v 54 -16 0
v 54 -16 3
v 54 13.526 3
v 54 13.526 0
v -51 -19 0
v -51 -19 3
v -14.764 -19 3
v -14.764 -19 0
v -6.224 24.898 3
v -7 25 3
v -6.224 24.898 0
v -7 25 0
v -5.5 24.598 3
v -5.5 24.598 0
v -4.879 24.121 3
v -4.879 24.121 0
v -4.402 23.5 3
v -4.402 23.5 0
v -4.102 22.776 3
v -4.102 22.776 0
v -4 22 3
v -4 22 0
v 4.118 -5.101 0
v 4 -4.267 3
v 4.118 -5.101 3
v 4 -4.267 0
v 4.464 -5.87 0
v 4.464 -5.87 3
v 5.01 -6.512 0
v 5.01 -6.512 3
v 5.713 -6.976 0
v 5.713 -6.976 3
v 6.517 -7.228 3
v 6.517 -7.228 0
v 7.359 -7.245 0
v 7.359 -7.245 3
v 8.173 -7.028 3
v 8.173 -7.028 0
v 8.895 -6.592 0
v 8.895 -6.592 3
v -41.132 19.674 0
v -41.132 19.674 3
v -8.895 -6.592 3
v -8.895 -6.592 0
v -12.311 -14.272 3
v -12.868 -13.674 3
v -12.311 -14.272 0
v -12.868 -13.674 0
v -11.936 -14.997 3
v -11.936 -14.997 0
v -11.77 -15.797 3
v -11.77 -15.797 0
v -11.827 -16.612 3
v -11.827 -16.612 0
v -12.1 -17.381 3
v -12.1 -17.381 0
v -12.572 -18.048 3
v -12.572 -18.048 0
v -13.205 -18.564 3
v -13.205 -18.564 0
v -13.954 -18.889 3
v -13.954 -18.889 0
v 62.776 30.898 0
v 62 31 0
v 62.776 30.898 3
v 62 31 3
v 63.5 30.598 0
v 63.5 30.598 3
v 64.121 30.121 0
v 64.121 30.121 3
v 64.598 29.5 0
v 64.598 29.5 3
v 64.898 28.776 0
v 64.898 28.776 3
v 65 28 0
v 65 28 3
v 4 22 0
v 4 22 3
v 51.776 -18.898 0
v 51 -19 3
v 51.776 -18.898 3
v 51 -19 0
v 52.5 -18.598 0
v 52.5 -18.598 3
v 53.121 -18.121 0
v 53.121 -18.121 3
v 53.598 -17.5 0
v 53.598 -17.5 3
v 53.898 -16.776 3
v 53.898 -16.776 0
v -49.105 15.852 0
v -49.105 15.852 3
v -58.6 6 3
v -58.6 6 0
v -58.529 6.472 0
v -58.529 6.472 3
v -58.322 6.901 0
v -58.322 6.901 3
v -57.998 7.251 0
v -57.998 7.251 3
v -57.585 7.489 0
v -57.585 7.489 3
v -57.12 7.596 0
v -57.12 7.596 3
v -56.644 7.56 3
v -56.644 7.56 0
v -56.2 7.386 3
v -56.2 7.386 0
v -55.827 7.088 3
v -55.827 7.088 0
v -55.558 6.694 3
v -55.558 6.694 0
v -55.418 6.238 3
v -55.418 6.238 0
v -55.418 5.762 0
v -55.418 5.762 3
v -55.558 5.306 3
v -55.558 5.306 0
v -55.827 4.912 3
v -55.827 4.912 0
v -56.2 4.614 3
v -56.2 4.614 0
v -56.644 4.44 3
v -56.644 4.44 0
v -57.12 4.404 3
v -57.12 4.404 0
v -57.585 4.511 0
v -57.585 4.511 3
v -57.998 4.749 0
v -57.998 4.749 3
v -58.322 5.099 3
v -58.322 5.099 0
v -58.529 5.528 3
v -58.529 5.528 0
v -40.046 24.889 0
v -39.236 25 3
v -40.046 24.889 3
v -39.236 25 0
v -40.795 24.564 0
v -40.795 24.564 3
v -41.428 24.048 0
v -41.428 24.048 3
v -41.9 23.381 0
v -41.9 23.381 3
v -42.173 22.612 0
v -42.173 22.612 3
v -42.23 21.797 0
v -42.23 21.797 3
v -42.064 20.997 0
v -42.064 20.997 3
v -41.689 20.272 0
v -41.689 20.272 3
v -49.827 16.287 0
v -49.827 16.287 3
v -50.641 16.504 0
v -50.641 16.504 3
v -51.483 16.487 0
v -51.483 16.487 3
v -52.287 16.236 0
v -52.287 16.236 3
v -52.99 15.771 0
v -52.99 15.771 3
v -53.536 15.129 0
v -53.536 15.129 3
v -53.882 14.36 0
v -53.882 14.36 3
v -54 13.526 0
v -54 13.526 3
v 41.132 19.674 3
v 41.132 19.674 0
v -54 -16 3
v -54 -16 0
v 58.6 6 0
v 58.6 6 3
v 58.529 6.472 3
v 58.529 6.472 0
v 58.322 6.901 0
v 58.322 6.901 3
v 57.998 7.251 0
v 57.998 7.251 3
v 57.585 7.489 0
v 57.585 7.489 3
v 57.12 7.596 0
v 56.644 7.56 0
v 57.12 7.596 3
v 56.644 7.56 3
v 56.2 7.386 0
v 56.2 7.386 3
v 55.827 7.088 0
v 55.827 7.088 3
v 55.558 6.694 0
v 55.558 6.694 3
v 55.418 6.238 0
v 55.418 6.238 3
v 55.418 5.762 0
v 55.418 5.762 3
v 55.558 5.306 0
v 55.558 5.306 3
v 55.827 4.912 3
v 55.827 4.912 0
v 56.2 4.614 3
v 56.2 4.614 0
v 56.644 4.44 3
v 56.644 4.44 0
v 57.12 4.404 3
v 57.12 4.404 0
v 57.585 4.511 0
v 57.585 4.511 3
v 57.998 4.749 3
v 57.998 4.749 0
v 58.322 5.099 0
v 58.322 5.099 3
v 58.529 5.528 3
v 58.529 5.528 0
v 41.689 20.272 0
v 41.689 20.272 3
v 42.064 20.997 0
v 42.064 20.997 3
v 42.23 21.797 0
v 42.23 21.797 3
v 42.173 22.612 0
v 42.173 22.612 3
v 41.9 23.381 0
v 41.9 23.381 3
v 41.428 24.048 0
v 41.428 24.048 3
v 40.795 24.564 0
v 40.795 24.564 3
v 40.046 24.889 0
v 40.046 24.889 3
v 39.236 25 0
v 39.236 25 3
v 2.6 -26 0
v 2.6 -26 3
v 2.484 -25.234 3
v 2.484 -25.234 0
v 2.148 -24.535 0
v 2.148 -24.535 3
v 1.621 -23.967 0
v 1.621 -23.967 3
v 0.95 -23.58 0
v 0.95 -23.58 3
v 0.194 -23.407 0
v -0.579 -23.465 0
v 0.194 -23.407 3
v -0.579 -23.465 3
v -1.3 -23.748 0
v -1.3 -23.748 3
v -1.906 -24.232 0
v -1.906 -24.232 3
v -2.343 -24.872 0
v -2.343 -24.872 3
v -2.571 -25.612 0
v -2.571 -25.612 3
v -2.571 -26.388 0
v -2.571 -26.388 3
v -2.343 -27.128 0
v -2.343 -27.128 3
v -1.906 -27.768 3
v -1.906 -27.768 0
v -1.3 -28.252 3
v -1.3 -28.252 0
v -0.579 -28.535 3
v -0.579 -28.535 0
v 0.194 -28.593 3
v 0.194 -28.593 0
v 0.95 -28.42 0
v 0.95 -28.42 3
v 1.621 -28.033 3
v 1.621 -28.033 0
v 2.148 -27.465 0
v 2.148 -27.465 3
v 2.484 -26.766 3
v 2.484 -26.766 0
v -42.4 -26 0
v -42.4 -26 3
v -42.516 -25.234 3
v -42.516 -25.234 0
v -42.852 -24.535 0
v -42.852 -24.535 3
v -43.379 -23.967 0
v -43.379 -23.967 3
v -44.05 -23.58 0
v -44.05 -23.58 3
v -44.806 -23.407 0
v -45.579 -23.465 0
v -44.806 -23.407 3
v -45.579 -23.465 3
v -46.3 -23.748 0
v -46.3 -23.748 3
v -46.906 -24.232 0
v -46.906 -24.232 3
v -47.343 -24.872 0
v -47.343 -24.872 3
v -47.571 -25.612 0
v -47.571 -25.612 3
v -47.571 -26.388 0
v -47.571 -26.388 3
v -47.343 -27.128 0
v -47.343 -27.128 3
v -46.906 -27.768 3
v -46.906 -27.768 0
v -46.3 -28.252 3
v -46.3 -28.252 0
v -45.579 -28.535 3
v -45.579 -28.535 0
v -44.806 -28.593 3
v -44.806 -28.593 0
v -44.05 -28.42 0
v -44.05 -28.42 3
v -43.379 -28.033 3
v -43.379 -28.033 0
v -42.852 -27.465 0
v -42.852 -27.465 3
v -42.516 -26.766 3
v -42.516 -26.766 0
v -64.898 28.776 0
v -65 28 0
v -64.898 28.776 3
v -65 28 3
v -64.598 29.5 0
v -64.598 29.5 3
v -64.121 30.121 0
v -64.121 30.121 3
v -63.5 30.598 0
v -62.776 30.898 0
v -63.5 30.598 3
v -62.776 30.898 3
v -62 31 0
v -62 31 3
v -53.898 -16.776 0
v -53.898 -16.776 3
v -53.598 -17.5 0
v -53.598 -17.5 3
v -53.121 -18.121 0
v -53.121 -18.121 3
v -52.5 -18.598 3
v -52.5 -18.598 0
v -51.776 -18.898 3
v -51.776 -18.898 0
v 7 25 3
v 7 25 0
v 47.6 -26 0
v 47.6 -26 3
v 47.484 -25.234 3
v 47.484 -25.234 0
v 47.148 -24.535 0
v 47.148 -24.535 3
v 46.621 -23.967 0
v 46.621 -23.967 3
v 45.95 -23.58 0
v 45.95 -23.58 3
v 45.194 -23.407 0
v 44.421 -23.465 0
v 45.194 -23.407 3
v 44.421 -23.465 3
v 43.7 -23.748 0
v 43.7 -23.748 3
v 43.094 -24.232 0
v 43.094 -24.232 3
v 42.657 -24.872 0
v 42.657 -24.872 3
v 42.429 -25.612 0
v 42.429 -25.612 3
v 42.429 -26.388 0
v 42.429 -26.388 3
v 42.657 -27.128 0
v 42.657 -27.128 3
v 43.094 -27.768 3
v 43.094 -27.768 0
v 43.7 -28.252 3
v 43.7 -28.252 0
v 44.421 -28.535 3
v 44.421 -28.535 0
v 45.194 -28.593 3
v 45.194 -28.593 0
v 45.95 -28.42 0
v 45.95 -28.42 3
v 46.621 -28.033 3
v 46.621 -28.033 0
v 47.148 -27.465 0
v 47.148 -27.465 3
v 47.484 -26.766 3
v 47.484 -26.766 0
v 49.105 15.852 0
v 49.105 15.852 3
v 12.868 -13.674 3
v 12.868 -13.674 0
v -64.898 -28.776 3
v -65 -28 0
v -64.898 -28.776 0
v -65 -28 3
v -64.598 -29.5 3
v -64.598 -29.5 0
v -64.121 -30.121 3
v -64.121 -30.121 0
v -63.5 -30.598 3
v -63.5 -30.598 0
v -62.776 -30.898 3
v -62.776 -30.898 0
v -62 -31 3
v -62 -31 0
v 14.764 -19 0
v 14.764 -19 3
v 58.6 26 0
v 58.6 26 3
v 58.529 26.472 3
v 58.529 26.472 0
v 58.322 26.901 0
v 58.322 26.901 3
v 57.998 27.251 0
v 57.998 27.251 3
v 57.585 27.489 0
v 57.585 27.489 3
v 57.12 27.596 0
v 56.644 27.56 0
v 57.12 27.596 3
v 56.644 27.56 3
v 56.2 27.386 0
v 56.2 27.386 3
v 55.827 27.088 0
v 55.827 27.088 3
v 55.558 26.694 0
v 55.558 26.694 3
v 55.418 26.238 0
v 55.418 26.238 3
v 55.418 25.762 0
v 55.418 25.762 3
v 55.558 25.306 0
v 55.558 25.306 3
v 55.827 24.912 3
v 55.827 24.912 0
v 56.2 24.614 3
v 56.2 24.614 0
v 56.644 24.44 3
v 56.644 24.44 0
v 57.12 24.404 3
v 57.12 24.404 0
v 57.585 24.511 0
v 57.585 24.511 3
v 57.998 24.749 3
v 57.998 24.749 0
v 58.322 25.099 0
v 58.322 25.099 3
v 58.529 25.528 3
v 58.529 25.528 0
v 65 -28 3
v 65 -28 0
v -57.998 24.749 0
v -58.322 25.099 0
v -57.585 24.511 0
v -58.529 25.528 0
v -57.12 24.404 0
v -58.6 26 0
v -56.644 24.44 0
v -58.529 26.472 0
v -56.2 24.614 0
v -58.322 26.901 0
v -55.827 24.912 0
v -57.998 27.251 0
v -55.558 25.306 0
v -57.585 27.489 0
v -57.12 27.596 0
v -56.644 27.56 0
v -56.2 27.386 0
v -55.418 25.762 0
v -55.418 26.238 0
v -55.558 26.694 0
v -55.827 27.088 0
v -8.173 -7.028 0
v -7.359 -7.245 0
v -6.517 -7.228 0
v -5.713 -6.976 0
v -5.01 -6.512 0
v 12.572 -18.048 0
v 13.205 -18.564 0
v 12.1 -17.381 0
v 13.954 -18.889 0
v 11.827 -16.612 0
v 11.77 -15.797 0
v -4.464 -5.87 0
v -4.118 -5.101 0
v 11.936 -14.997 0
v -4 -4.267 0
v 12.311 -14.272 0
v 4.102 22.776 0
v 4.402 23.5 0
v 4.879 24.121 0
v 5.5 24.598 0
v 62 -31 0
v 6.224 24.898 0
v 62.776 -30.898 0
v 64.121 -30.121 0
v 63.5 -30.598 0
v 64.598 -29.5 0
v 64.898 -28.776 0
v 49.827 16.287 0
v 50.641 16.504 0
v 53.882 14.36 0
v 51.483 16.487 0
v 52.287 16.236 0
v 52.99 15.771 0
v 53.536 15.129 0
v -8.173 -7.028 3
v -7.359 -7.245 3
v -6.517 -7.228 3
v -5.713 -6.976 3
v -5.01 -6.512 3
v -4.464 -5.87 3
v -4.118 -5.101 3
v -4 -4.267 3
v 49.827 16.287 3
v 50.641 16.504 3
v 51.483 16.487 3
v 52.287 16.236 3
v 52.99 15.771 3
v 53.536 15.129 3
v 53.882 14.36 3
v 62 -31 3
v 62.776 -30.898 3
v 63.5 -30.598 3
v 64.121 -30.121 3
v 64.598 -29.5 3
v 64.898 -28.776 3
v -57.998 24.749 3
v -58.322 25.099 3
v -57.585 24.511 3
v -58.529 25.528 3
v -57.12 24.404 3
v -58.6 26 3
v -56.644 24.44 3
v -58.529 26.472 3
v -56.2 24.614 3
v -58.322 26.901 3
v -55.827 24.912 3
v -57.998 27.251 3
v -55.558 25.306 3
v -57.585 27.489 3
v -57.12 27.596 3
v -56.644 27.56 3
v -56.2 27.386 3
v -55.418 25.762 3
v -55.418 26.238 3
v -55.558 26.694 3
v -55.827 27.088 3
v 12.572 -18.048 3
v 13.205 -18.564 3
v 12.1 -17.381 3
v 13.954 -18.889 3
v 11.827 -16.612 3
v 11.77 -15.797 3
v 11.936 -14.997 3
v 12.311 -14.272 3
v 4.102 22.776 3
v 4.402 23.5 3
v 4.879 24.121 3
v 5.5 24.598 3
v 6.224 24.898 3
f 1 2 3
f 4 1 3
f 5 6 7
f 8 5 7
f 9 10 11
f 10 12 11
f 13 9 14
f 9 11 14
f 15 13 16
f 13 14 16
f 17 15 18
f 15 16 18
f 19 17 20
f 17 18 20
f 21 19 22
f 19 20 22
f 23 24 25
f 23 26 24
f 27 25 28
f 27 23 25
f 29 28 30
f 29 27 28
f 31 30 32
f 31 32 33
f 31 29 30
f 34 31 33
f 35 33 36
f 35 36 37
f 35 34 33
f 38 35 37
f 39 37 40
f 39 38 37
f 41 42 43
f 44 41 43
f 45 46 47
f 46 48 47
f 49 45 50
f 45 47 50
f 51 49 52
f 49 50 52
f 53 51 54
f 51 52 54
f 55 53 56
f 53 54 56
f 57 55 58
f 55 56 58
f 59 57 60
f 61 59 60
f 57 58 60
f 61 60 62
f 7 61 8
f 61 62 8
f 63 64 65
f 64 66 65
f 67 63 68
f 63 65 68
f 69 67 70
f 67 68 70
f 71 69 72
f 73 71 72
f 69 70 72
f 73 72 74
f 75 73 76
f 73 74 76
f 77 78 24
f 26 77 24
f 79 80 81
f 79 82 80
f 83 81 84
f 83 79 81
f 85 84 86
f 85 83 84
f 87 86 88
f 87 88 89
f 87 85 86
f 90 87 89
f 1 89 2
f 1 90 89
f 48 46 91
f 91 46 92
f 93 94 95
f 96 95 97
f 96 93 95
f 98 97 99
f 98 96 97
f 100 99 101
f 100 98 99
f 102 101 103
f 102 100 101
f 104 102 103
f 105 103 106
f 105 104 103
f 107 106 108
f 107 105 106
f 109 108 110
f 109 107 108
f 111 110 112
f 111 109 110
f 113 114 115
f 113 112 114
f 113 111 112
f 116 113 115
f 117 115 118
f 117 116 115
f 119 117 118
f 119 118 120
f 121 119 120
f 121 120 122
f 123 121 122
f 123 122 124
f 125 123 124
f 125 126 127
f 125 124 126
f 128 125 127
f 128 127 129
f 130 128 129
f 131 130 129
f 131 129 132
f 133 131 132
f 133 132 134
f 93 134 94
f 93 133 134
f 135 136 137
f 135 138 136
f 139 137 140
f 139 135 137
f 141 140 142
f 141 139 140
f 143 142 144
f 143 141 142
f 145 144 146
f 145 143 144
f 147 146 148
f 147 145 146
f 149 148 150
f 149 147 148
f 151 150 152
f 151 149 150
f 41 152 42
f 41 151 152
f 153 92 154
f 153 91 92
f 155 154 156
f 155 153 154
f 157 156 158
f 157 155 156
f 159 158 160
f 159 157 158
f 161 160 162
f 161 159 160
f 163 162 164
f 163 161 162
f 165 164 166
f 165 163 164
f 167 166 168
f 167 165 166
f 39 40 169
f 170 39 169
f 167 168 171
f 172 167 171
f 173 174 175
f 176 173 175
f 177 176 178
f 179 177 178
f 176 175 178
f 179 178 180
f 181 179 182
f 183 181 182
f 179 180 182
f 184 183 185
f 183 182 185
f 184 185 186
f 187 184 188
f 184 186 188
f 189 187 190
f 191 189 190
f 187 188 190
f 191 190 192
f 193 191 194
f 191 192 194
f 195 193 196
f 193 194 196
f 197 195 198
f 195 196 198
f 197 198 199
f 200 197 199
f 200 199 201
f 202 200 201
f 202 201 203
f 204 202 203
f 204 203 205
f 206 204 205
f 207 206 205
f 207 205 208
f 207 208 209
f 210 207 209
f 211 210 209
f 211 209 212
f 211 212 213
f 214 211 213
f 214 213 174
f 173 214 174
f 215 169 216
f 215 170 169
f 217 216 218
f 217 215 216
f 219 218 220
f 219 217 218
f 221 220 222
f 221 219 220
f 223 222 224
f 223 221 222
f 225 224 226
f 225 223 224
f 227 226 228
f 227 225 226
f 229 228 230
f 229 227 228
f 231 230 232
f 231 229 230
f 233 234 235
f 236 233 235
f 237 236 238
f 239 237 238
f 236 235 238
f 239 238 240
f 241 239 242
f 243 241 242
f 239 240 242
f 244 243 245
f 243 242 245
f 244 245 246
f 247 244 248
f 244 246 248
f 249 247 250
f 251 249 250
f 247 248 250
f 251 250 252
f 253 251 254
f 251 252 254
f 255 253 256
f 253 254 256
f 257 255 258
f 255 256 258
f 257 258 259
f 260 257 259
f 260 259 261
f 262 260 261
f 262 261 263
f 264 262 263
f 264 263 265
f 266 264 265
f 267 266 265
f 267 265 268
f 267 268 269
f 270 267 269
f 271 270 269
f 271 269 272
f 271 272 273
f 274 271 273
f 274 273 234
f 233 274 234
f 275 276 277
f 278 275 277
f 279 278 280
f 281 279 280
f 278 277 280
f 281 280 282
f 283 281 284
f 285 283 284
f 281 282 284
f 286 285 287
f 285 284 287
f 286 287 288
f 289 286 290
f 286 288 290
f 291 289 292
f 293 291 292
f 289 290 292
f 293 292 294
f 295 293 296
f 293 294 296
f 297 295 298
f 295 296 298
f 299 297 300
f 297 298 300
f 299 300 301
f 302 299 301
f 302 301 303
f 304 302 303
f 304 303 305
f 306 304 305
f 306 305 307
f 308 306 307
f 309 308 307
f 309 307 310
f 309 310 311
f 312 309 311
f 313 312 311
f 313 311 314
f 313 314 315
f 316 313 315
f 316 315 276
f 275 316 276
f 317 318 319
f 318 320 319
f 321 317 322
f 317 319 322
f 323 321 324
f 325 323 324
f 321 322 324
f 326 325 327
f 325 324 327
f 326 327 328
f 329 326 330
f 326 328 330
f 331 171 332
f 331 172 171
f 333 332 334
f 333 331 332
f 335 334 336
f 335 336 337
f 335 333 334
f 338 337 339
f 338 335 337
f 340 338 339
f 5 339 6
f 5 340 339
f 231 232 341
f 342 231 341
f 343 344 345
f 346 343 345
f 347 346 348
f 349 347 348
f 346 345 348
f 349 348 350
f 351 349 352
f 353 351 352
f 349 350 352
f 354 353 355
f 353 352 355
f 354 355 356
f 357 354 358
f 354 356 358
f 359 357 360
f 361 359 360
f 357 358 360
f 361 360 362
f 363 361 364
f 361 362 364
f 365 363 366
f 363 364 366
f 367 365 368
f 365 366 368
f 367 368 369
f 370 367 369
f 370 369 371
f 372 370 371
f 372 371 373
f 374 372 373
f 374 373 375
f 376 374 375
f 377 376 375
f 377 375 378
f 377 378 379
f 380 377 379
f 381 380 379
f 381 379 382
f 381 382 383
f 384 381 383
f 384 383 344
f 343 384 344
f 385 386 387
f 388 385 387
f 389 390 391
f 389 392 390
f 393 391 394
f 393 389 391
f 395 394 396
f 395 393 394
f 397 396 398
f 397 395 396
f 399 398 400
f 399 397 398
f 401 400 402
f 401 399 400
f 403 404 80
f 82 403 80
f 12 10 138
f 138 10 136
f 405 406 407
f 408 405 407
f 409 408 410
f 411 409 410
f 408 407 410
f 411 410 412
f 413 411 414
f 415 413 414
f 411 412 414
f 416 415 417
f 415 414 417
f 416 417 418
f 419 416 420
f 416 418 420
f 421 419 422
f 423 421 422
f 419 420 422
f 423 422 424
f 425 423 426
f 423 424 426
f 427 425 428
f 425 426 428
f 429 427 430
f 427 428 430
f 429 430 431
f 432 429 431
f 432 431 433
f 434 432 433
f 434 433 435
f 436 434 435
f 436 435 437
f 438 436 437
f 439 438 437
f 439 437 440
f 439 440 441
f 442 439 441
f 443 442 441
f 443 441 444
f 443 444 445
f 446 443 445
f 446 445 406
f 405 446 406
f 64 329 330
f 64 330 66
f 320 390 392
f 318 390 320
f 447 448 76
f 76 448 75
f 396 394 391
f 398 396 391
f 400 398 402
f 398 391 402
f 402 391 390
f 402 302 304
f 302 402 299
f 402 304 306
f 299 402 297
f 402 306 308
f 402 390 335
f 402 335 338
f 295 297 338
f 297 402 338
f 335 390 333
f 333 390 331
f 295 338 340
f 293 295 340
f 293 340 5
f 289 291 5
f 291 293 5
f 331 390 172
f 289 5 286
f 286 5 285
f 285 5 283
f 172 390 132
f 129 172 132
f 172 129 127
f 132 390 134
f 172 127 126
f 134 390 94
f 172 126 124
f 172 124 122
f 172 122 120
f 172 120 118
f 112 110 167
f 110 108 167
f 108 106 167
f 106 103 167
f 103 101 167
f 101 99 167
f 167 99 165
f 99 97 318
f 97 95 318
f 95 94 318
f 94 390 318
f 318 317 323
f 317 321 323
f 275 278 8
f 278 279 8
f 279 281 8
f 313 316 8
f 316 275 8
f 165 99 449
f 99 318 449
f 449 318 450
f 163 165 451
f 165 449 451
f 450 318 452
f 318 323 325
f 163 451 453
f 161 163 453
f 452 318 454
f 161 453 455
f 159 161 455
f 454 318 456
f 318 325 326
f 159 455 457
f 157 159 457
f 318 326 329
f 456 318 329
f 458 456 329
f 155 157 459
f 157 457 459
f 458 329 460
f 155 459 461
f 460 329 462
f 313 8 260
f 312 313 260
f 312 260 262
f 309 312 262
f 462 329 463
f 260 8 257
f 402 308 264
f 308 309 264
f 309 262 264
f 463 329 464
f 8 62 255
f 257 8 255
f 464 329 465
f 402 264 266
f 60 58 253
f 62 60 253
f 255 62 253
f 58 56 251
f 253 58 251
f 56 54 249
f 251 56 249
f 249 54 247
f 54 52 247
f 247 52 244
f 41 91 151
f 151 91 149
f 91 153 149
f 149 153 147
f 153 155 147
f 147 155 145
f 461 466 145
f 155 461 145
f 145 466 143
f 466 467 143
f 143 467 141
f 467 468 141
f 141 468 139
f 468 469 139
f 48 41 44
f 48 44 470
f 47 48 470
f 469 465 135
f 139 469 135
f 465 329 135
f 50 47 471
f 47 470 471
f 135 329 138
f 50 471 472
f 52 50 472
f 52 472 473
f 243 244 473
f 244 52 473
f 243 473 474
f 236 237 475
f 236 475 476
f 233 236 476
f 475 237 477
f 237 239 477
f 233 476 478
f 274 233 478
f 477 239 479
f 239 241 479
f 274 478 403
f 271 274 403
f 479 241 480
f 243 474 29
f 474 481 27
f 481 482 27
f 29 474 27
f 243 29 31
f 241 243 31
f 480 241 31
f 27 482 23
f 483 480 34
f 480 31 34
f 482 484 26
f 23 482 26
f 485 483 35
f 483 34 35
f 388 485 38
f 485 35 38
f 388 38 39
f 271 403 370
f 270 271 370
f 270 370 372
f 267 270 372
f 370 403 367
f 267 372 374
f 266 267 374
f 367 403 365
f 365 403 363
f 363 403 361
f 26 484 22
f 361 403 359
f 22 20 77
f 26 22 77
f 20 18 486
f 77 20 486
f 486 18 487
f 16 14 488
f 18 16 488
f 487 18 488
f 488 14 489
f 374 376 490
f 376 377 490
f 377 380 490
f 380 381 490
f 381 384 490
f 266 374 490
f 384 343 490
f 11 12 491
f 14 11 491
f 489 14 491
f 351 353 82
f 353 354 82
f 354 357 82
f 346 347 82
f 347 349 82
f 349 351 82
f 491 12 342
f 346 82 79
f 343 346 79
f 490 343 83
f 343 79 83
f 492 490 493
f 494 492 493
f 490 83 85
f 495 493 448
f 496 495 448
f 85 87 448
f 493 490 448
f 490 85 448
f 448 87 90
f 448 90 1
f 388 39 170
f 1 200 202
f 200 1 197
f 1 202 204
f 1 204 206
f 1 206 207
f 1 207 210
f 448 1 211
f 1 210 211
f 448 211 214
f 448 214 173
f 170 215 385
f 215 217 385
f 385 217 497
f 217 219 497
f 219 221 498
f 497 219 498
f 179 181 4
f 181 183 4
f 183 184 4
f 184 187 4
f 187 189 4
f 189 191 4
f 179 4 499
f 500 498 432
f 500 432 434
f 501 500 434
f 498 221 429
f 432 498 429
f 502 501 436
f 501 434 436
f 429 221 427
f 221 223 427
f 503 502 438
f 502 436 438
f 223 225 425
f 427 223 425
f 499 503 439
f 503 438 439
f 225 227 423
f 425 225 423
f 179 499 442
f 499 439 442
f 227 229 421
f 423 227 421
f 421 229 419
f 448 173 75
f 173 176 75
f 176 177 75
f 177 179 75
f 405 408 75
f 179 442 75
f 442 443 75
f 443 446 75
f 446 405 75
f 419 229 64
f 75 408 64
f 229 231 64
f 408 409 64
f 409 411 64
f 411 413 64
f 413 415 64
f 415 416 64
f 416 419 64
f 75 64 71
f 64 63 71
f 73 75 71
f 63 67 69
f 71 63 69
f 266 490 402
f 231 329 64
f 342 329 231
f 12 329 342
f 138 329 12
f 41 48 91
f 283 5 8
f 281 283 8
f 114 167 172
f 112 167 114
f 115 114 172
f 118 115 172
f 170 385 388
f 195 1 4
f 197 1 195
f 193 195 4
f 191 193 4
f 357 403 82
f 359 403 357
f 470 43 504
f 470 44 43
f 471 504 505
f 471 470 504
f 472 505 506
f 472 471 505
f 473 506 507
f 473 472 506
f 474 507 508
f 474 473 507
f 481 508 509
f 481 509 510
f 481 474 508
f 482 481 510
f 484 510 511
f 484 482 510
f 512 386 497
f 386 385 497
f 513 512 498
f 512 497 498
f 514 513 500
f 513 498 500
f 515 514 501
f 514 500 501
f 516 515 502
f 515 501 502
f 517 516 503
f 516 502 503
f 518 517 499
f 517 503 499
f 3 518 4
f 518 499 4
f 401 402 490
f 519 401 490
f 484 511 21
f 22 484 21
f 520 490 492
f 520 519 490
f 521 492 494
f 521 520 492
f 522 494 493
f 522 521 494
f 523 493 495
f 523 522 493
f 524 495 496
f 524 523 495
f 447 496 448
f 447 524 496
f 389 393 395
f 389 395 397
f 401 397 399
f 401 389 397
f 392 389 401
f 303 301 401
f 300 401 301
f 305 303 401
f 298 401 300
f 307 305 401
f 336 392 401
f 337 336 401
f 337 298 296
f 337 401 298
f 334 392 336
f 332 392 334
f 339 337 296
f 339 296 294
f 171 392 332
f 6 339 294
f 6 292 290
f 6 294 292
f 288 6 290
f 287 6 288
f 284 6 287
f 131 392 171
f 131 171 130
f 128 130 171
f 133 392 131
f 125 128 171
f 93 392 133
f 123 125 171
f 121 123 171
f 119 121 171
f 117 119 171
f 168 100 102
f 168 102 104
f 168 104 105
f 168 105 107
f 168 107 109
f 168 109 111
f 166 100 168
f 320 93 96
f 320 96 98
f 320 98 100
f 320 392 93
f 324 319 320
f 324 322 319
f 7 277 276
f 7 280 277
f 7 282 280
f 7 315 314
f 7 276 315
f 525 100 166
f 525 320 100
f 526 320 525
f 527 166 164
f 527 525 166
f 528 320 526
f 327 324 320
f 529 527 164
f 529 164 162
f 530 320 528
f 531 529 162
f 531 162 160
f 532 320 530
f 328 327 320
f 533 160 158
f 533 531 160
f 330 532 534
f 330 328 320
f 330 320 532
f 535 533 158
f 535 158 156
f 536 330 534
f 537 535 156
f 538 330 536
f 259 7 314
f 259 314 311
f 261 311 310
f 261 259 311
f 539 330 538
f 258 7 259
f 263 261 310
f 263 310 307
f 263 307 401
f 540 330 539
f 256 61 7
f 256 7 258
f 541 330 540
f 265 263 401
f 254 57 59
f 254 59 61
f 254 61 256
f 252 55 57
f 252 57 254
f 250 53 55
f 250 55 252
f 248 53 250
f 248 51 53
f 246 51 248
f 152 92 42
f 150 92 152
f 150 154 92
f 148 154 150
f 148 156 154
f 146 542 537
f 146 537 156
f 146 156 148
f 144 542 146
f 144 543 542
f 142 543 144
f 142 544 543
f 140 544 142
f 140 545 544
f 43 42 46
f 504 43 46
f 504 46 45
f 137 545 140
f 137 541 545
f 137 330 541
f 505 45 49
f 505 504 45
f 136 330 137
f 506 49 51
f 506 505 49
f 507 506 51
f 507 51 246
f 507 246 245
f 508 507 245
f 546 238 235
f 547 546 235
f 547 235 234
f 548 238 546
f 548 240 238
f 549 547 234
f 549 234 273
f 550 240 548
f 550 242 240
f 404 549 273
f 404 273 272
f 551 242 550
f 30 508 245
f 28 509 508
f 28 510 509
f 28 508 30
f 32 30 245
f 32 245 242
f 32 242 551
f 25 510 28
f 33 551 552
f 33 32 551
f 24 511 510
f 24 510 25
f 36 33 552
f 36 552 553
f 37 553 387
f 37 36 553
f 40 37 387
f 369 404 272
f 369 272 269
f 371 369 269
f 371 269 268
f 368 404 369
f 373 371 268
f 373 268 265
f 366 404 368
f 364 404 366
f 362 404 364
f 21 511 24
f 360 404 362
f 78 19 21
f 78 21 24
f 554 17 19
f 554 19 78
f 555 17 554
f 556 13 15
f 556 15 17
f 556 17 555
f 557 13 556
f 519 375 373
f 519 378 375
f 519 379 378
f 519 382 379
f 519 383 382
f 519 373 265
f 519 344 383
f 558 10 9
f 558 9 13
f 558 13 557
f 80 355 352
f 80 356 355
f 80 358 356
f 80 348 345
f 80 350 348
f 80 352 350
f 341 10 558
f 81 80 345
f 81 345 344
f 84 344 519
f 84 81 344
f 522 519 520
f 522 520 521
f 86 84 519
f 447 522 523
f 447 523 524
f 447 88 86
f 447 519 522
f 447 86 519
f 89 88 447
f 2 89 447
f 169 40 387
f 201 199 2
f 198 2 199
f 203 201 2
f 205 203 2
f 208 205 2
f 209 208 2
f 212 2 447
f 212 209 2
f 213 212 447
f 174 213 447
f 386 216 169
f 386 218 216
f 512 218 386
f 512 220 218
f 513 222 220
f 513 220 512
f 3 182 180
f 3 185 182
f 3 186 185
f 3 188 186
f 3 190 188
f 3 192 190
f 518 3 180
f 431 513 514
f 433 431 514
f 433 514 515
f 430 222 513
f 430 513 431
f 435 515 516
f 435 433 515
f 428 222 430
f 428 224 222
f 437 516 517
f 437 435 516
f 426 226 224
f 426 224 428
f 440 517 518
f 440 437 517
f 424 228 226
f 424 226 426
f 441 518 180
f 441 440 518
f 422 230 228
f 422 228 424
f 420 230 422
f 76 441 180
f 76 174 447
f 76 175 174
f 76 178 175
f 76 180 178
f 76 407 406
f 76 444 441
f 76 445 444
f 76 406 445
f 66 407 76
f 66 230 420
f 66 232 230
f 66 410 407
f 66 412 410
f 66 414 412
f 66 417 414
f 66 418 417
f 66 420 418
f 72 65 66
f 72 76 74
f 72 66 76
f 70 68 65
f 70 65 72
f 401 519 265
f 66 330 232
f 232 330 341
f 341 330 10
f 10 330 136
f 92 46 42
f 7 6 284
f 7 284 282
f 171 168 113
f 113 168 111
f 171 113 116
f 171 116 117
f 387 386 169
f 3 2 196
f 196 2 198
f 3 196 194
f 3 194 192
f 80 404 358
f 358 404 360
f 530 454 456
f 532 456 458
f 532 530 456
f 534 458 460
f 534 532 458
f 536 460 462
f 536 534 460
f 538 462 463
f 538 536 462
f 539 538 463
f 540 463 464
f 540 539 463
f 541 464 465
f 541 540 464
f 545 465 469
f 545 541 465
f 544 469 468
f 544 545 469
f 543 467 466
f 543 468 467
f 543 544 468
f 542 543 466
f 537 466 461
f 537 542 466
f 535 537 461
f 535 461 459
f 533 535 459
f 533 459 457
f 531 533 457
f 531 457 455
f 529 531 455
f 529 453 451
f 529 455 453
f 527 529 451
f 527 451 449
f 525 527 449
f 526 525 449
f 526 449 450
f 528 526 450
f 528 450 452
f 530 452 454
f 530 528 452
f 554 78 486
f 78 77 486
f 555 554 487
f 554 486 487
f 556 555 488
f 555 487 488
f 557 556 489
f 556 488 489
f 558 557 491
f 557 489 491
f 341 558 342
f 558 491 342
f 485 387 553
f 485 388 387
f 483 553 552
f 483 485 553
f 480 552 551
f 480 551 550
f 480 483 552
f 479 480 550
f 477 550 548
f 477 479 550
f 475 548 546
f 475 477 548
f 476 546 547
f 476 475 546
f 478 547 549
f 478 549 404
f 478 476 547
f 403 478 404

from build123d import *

# Parameters (mm, degrees)
SKETCH_1_W          = 130
SKETCH_1_H          = 62
EXTRUDE_1_DEPTH     = 3
SKETCH_2_R          = 2.6
CUT_EXTRUDE_1_DEPTH = 4
SKETCH_3_R          = 1.6
CUT_EXTRUDE_2_DEPTH = 4
CUT_EXTRUDE_3_DEPTH = 4
FILLET_1_R          = 3
FILLET_2_R          = 3


with BuildPart() as part:
    # 草图1 → 凸台-拉伸1 (new body)
    with BuildSketch(Plane.XY):
        Rectangle(SKETCH_1_W, SKETCH_1_H)
    extrude(amount=EXTRUDE_1_DEPTH)

    # 草图2 → 切除-拉伸1 (cut, through all)
    with BuildSketch(Plane.XY.offset(3)):
        with Locations((-45, -26)):
            Circle(SKETCH_2_R)
        with Locations((0, -26)):
            Circle(SKETCH_2_R)
        with Locations((45, -26)):
            Circle(SKETCH_2_R)
    extrude(amount=-CUT_EXTRUDE_1_DEPTH, mode=Mode.SUBTRACT)

    # 草图3 → 切除-拉伸2 (cut, through all)
    with BuildSketch(Plane.XY.offset(3)):
        with Locations((57, 26)):
            Circle(SKETCH_3_R)
        with Locations((57, 6)):
            Circle(SKETCH_3_R)
    cut_extrude_2 = extrude(amount=-CUT_EXTRUDE_2_DEPTH, mode=Mode.SUBTRACT)

    # 镜向1: 切除-拉伸2 across plane
    add(cut_extrude_2.mirror(Plane(origin=(0, 0, 0), x_dir=(0, 0, 1), z_dir=(1, 0, 0))), mode=Mode.SUBTRACT)

    # 草图4 → 切除-拉伸3 (cut, through all)
    with BuildSketch(Plane.XY.offset(3)):
        Polygon((-6.332390824, -19), (-54, 19.840274143), (-54, -19), align=None)
        Polygon((-4, 25), (-47.667609176, 25), (-4, -10.581014884), align=None)
        Polygon((4, 25), (4, -10.581014884), (47.667609176, 25), align=None)
        Polygon((54, 19.840274143), (6.332390824, -19), (54, -19), align=None)
    extrude(amount=-CUT_EXTRUDE_3_DEPTH, mode=Mode.SUBTRACT)

    # 圆角1
    fillet_1_edges = [part.edges().sort_by_distance(p)[0] for p in [
        (-47.667609176, 25, 1.5),
        (-4, 25, 1.5),
        (-4, -10.581014884, 1.5),
        (4, -10.581014884, 1.5),
        (4, 25, 1.5),
        (47.667609176, 25, 1.5),
        (6.332390824, -19, 1.5),
        (54, 19.840274143, 1.5),
        (54, -19, 1.5),
        (-54, 19.840274143, 1.5),
        (-6.332390824, -19, 1.5),
        (-54, -19, 1.5),
    ]]
    fillet(fillet_1_edges, radius=FILLET_1_R)

    # 圆角2
    fillet_2_edges = [part.edges().sort_by_distance(p)[0] for p in [
        (65, -31, 1.5),
        (-65, -31, 1.5),
        (-65, 31, 1.5),
        (65, 31, 1.5),
    ]]
    fillet(fillet_2_edges, radius=FILLET_2_R)


solid = part.part
